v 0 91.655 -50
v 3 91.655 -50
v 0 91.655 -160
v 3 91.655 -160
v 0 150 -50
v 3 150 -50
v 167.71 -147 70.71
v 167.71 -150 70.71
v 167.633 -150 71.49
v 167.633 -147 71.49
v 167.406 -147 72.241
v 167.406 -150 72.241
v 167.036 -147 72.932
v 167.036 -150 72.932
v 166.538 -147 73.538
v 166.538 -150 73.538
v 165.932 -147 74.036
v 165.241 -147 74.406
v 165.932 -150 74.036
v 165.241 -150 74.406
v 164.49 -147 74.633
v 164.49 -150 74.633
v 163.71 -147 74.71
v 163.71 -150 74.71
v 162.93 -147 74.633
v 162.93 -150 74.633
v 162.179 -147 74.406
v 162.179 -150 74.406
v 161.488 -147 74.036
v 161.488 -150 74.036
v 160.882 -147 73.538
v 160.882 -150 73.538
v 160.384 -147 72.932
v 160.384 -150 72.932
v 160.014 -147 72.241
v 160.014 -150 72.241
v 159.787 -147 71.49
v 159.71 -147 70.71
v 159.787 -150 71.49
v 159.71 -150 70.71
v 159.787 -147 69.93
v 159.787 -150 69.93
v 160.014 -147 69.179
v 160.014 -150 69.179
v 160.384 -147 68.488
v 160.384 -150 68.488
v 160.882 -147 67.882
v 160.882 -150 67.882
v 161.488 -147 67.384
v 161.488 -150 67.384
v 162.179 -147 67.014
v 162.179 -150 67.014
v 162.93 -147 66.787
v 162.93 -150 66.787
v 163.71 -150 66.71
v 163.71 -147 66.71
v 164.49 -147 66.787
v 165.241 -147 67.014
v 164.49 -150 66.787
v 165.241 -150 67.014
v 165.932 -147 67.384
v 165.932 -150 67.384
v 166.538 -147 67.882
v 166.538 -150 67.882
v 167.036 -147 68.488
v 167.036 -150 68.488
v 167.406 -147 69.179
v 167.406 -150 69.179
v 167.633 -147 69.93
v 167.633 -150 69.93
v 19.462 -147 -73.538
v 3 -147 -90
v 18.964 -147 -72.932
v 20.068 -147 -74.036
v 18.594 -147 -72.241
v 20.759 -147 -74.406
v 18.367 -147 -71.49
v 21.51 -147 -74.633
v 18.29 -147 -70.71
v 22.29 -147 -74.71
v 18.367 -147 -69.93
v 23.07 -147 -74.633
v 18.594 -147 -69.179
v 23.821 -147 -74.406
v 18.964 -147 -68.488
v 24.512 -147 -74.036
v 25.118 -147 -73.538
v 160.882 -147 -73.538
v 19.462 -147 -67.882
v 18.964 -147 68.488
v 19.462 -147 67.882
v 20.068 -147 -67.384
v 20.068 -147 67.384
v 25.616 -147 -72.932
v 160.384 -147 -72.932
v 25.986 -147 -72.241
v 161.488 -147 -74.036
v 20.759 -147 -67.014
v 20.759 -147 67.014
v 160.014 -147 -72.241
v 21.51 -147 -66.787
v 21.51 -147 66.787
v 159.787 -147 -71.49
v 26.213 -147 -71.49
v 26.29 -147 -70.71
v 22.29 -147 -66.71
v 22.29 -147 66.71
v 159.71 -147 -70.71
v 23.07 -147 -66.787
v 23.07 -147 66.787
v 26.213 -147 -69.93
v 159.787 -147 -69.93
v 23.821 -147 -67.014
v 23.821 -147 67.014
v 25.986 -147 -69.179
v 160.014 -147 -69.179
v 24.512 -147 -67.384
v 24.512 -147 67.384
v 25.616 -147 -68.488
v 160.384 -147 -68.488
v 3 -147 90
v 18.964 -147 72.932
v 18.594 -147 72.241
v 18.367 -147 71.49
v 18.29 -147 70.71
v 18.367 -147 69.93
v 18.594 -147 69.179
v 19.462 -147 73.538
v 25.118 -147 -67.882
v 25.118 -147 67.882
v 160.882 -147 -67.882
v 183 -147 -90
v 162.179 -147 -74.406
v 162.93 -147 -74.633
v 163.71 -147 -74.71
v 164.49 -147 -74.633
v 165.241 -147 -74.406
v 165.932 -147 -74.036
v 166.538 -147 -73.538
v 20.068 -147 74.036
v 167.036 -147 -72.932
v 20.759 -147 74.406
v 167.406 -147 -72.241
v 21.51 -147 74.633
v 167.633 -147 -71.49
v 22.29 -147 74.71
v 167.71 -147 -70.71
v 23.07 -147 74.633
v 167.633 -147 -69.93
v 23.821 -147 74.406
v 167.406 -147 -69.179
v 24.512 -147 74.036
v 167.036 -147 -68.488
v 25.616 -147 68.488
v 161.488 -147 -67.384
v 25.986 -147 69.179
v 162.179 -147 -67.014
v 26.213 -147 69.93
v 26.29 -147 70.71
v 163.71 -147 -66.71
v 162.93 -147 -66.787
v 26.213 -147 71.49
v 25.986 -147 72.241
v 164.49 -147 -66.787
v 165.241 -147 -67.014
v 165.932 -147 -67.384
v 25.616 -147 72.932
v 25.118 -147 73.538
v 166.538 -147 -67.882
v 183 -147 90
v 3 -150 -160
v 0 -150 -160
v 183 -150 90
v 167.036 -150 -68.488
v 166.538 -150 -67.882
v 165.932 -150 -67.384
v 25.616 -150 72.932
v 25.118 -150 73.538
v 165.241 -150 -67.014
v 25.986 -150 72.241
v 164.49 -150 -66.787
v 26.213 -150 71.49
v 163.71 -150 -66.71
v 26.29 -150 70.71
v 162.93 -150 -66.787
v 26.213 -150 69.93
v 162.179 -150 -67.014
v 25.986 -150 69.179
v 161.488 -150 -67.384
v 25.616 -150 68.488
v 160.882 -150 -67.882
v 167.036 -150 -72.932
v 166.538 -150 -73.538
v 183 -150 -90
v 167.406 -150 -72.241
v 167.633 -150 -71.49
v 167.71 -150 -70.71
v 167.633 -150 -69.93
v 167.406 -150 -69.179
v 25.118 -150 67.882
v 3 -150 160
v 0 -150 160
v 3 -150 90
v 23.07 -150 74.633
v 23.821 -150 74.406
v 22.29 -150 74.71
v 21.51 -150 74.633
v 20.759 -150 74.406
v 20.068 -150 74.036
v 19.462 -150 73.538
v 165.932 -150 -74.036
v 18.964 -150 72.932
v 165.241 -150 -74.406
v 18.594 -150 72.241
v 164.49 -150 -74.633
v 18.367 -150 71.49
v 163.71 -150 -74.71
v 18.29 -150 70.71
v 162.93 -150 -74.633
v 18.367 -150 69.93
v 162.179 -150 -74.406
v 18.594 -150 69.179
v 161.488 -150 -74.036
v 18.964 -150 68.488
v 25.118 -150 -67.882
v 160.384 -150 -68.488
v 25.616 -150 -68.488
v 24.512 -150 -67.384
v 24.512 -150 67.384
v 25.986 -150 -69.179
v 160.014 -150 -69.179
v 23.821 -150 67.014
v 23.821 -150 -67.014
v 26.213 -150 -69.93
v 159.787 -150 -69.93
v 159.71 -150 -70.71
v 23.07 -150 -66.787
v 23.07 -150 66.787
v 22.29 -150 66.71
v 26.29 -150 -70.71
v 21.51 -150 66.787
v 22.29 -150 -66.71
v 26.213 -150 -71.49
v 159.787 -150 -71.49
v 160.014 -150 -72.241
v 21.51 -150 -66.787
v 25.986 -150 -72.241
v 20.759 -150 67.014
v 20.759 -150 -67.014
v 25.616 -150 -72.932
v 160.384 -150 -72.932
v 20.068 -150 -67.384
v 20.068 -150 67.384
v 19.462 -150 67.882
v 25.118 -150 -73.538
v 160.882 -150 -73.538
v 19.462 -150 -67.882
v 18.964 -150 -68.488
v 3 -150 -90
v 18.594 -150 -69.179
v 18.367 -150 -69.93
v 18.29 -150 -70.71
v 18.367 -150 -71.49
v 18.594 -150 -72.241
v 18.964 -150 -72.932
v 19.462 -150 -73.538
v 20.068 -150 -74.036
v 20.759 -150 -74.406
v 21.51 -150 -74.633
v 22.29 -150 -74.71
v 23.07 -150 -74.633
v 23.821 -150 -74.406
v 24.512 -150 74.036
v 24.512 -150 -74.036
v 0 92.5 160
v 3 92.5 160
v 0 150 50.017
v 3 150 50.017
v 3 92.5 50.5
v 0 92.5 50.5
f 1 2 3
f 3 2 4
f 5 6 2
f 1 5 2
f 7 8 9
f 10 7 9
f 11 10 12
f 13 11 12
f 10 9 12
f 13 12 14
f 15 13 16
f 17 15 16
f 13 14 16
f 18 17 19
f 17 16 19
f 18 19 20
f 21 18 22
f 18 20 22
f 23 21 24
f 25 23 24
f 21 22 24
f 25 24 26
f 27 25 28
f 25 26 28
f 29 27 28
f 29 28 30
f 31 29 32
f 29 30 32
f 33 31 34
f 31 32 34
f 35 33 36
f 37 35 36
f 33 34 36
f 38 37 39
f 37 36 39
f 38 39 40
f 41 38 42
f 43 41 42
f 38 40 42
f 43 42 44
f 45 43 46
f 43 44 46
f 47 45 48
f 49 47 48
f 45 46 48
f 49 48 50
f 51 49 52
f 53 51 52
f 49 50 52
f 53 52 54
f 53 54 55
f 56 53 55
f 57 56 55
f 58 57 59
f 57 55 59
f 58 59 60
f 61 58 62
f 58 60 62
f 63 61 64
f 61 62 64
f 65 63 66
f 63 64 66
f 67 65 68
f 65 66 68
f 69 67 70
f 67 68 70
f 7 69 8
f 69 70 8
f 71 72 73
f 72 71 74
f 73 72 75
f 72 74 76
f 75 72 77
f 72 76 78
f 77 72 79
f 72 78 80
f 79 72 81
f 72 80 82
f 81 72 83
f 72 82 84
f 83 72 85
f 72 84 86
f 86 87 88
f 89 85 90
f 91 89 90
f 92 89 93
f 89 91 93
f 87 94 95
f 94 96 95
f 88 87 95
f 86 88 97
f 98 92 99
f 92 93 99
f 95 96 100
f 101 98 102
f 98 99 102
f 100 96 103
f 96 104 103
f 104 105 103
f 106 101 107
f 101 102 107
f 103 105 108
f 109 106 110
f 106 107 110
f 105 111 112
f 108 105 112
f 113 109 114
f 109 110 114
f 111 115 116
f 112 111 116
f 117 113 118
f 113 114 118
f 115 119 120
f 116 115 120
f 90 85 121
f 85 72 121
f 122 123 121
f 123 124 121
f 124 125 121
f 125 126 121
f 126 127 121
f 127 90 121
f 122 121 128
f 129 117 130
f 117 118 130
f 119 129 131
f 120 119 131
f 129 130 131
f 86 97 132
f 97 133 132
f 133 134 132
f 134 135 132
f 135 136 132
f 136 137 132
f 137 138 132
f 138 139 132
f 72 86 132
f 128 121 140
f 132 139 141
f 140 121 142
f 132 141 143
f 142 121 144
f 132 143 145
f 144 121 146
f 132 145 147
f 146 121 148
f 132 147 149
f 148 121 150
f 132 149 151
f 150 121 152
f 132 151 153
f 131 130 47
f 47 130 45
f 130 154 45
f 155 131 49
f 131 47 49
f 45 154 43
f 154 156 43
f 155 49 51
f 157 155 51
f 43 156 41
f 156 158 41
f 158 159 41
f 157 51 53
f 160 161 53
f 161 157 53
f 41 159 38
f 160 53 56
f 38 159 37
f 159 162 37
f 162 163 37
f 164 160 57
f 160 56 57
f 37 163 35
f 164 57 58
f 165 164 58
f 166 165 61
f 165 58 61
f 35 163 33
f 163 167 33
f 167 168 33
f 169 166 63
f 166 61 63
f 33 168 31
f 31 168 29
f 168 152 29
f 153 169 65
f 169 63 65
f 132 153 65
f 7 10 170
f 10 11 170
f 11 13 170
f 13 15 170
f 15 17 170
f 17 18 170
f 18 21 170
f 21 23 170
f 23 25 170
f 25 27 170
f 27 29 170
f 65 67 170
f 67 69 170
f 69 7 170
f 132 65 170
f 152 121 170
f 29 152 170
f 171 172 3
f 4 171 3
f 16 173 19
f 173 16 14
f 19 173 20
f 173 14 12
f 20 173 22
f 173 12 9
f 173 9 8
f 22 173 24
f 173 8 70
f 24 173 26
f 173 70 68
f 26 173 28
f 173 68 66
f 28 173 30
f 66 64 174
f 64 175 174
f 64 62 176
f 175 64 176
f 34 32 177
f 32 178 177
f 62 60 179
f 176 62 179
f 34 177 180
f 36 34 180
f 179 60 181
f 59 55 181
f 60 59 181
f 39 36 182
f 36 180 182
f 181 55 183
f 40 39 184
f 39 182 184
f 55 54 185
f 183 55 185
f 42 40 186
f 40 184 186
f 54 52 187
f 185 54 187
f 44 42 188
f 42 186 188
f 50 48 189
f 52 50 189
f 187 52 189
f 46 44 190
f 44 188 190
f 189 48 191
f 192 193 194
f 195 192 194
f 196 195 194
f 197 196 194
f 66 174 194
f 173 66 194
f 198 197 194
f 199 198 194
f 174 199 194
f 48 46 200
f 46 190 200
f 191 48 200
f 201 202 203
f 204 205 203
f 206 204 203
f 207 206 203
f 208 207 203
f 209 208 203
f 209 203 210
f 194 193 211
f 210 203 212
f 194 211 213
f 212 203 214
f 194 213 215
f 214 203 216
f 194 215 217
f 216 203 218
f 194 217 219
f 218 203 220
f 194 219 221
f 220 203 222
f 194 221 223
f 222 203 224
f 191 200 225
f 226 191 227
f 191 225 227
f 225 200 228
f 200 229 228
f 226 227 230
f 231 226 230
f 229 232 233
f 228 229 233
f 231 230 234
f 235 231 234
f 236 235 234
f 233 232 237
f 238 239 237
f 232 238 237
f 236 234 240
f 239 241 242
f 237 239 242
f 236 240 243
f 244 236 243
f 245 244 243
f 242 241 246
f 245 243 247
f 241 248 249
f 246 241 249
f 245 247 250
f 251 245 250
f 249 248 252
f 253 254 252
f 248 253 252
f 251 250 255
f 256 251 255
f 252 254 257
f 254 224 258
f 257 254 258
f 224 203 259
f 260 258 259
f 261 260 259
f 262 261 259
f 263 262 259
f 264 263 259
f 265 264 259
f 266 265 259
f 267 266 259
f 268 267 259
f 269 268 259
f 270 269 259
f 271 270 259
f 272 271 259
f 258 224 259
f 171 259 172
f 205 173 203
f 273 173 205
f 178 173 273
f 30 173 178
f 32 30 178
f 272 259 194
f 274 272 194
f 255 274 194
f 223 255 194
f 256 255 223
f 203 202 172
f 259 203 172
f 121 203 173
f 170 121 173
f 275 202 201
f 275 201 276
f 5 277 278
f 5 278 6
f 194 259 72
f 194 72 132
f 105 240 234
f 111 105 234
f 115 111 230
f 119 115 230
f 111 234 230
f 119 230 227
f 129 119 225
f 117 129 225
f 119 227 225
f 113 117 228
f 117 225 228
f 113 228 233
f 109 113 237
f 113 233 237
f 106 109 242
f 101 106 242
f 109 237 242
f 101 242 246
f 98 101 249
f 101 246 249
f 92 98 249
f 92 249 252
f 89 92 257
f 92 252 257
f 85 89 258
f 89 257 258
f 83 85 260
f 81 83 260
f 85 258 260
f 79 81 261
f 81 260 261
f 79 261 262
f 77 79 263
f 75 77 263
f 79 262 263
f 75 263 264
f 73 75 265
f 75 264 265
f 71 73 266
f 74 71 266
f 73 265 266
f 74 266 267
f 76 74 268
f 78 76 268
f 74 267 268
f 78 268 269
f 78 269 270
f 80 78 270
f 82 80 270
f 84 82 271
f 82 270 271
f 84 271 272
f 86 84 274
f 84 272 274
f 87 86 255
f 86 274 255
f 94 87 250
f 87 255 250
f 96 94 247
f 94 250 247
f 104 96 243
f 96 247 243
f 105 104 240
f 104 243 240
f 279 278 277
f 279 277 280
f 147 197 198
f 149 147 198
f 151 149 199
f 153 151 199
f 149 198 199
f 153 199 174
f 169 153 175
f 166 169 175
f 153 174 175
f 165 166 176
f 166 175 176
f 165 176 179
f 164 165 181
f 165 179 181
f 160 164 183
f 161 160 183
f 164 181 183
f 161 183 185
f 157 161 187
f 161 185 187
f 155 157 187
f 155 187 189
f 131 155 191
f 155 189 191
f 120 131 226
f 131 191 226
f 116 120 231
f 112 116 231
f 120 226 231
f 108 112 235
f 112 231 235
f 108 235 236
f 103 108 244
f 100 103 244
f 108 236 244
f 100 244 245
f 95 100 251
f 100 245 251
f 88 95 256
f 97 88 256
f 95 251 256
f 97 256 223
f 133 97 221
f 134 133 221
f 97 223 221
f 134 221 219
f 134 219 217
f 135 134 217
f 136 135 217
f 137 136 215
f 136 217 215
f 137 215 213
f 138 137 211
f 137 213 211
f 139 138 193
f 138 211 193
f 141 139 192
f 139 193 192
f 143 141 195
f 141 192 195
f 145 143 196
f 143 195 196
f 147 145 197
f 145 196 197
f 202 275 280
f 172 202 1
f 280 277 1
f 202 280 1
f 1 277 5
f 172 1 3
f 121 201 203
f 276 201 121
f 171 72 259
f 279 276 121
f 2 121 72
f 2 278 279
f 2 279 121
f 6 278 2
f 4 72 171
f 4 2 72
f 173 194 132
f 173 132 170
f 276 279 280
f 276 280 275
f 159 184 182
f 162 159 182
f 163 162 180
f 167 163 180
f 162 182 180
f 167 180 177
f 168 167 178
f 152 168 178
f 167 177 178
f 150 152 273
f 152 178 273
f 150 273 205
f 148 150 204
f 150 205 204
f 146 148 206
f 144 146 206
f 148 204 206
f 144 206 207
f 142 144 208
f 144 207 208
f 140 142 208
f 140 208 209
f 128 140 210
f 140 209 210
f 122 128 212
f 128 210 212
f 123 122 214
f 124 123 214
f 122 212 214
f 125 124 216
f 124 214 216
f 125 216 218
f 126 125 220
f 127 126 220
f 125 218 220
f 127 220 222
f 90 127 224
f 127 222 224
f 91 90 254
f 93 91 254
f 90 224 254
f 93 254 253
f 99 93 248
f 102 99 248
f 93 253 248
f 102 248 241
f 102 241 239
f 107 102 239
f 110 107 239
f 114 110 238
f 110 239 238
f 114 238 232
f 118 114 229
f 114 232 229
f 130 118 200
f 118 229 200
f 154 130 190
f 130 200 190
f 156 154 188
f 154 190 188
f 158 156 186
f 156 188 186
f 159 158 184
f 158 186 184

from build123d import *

# Parameters (mm, degrees)
SKETCH1_W           = 320
SKETCH1_H           = 300
BOSS_EXTRUDE1_DEPTH = 3
SKETCH2_W           = 180
SKETCH2_H           = 180
SKETCH2_R           = 4
BOSS_EXTRUDE2_DEPTH = 3
CUT_EXTRUDE1_DEPTH  = 10


with BuildPart() as part:
    # Sketch1 → Boss-Extrude1 (new body)
    with BuildSketch(Plane(origin=(0, 0, 0), x_dir=(0, 0, -1), z_dir=(1, 0, 0))):
        Rectangle(SKETCH1_W, SKETCH1_H)
    extrude(amount=BOSS_EXTRUDE1_DEPTH)

    # Sketch2 → Boss-Extrude2 (add)
    with BuildSketch(Plane.XZ.offset(150)):
        with Locations((93, 0)):
            Rectangle(SKETCH2_W, SKETCH2_H)
        with Locations((22.29, -70.71)):
            Circle(SKETCH2_R, mode=Mode.SUBTRACT)
        with Locations((22.29, 70.71)):
            Circle(SKETCH2_R, mode=Mode.SUBTRACT)
        with Locations((163.71, 70.71)):
            Circle(SKETCH2_R, mode=Mode.SUBTRACT)
        with Locations((163.71, -70.71)):
            Circle(SKETCH2_R, mode=Mode.SUBTRACT)
    extrude(amount=-BOSS_EXTRUDE2_DEPTH)

    # Sketch3 → Cut-Extrude1 (cut)
    with BuildSketch(Plane(origin=(3, 0, 0), x_dir=(0, 0, -1), z_dir=(1, 0, 0))):
        Polygon((-50, 152), (-50.5, 92.5), (-174.995322546, 92.5), (-174.995322546, 153.849759006), (-150, 158.899747984), align=None)
        Polygon((186.01679007, 162.206902793), (50, 152), (50, 91.655462185), (186.01679007, 91.655462185), align=None)
    extrude(amount=-CUT_EXTRUDE1_DEPTH, mode=Mode.SUBTRACT)


solid = part.part
